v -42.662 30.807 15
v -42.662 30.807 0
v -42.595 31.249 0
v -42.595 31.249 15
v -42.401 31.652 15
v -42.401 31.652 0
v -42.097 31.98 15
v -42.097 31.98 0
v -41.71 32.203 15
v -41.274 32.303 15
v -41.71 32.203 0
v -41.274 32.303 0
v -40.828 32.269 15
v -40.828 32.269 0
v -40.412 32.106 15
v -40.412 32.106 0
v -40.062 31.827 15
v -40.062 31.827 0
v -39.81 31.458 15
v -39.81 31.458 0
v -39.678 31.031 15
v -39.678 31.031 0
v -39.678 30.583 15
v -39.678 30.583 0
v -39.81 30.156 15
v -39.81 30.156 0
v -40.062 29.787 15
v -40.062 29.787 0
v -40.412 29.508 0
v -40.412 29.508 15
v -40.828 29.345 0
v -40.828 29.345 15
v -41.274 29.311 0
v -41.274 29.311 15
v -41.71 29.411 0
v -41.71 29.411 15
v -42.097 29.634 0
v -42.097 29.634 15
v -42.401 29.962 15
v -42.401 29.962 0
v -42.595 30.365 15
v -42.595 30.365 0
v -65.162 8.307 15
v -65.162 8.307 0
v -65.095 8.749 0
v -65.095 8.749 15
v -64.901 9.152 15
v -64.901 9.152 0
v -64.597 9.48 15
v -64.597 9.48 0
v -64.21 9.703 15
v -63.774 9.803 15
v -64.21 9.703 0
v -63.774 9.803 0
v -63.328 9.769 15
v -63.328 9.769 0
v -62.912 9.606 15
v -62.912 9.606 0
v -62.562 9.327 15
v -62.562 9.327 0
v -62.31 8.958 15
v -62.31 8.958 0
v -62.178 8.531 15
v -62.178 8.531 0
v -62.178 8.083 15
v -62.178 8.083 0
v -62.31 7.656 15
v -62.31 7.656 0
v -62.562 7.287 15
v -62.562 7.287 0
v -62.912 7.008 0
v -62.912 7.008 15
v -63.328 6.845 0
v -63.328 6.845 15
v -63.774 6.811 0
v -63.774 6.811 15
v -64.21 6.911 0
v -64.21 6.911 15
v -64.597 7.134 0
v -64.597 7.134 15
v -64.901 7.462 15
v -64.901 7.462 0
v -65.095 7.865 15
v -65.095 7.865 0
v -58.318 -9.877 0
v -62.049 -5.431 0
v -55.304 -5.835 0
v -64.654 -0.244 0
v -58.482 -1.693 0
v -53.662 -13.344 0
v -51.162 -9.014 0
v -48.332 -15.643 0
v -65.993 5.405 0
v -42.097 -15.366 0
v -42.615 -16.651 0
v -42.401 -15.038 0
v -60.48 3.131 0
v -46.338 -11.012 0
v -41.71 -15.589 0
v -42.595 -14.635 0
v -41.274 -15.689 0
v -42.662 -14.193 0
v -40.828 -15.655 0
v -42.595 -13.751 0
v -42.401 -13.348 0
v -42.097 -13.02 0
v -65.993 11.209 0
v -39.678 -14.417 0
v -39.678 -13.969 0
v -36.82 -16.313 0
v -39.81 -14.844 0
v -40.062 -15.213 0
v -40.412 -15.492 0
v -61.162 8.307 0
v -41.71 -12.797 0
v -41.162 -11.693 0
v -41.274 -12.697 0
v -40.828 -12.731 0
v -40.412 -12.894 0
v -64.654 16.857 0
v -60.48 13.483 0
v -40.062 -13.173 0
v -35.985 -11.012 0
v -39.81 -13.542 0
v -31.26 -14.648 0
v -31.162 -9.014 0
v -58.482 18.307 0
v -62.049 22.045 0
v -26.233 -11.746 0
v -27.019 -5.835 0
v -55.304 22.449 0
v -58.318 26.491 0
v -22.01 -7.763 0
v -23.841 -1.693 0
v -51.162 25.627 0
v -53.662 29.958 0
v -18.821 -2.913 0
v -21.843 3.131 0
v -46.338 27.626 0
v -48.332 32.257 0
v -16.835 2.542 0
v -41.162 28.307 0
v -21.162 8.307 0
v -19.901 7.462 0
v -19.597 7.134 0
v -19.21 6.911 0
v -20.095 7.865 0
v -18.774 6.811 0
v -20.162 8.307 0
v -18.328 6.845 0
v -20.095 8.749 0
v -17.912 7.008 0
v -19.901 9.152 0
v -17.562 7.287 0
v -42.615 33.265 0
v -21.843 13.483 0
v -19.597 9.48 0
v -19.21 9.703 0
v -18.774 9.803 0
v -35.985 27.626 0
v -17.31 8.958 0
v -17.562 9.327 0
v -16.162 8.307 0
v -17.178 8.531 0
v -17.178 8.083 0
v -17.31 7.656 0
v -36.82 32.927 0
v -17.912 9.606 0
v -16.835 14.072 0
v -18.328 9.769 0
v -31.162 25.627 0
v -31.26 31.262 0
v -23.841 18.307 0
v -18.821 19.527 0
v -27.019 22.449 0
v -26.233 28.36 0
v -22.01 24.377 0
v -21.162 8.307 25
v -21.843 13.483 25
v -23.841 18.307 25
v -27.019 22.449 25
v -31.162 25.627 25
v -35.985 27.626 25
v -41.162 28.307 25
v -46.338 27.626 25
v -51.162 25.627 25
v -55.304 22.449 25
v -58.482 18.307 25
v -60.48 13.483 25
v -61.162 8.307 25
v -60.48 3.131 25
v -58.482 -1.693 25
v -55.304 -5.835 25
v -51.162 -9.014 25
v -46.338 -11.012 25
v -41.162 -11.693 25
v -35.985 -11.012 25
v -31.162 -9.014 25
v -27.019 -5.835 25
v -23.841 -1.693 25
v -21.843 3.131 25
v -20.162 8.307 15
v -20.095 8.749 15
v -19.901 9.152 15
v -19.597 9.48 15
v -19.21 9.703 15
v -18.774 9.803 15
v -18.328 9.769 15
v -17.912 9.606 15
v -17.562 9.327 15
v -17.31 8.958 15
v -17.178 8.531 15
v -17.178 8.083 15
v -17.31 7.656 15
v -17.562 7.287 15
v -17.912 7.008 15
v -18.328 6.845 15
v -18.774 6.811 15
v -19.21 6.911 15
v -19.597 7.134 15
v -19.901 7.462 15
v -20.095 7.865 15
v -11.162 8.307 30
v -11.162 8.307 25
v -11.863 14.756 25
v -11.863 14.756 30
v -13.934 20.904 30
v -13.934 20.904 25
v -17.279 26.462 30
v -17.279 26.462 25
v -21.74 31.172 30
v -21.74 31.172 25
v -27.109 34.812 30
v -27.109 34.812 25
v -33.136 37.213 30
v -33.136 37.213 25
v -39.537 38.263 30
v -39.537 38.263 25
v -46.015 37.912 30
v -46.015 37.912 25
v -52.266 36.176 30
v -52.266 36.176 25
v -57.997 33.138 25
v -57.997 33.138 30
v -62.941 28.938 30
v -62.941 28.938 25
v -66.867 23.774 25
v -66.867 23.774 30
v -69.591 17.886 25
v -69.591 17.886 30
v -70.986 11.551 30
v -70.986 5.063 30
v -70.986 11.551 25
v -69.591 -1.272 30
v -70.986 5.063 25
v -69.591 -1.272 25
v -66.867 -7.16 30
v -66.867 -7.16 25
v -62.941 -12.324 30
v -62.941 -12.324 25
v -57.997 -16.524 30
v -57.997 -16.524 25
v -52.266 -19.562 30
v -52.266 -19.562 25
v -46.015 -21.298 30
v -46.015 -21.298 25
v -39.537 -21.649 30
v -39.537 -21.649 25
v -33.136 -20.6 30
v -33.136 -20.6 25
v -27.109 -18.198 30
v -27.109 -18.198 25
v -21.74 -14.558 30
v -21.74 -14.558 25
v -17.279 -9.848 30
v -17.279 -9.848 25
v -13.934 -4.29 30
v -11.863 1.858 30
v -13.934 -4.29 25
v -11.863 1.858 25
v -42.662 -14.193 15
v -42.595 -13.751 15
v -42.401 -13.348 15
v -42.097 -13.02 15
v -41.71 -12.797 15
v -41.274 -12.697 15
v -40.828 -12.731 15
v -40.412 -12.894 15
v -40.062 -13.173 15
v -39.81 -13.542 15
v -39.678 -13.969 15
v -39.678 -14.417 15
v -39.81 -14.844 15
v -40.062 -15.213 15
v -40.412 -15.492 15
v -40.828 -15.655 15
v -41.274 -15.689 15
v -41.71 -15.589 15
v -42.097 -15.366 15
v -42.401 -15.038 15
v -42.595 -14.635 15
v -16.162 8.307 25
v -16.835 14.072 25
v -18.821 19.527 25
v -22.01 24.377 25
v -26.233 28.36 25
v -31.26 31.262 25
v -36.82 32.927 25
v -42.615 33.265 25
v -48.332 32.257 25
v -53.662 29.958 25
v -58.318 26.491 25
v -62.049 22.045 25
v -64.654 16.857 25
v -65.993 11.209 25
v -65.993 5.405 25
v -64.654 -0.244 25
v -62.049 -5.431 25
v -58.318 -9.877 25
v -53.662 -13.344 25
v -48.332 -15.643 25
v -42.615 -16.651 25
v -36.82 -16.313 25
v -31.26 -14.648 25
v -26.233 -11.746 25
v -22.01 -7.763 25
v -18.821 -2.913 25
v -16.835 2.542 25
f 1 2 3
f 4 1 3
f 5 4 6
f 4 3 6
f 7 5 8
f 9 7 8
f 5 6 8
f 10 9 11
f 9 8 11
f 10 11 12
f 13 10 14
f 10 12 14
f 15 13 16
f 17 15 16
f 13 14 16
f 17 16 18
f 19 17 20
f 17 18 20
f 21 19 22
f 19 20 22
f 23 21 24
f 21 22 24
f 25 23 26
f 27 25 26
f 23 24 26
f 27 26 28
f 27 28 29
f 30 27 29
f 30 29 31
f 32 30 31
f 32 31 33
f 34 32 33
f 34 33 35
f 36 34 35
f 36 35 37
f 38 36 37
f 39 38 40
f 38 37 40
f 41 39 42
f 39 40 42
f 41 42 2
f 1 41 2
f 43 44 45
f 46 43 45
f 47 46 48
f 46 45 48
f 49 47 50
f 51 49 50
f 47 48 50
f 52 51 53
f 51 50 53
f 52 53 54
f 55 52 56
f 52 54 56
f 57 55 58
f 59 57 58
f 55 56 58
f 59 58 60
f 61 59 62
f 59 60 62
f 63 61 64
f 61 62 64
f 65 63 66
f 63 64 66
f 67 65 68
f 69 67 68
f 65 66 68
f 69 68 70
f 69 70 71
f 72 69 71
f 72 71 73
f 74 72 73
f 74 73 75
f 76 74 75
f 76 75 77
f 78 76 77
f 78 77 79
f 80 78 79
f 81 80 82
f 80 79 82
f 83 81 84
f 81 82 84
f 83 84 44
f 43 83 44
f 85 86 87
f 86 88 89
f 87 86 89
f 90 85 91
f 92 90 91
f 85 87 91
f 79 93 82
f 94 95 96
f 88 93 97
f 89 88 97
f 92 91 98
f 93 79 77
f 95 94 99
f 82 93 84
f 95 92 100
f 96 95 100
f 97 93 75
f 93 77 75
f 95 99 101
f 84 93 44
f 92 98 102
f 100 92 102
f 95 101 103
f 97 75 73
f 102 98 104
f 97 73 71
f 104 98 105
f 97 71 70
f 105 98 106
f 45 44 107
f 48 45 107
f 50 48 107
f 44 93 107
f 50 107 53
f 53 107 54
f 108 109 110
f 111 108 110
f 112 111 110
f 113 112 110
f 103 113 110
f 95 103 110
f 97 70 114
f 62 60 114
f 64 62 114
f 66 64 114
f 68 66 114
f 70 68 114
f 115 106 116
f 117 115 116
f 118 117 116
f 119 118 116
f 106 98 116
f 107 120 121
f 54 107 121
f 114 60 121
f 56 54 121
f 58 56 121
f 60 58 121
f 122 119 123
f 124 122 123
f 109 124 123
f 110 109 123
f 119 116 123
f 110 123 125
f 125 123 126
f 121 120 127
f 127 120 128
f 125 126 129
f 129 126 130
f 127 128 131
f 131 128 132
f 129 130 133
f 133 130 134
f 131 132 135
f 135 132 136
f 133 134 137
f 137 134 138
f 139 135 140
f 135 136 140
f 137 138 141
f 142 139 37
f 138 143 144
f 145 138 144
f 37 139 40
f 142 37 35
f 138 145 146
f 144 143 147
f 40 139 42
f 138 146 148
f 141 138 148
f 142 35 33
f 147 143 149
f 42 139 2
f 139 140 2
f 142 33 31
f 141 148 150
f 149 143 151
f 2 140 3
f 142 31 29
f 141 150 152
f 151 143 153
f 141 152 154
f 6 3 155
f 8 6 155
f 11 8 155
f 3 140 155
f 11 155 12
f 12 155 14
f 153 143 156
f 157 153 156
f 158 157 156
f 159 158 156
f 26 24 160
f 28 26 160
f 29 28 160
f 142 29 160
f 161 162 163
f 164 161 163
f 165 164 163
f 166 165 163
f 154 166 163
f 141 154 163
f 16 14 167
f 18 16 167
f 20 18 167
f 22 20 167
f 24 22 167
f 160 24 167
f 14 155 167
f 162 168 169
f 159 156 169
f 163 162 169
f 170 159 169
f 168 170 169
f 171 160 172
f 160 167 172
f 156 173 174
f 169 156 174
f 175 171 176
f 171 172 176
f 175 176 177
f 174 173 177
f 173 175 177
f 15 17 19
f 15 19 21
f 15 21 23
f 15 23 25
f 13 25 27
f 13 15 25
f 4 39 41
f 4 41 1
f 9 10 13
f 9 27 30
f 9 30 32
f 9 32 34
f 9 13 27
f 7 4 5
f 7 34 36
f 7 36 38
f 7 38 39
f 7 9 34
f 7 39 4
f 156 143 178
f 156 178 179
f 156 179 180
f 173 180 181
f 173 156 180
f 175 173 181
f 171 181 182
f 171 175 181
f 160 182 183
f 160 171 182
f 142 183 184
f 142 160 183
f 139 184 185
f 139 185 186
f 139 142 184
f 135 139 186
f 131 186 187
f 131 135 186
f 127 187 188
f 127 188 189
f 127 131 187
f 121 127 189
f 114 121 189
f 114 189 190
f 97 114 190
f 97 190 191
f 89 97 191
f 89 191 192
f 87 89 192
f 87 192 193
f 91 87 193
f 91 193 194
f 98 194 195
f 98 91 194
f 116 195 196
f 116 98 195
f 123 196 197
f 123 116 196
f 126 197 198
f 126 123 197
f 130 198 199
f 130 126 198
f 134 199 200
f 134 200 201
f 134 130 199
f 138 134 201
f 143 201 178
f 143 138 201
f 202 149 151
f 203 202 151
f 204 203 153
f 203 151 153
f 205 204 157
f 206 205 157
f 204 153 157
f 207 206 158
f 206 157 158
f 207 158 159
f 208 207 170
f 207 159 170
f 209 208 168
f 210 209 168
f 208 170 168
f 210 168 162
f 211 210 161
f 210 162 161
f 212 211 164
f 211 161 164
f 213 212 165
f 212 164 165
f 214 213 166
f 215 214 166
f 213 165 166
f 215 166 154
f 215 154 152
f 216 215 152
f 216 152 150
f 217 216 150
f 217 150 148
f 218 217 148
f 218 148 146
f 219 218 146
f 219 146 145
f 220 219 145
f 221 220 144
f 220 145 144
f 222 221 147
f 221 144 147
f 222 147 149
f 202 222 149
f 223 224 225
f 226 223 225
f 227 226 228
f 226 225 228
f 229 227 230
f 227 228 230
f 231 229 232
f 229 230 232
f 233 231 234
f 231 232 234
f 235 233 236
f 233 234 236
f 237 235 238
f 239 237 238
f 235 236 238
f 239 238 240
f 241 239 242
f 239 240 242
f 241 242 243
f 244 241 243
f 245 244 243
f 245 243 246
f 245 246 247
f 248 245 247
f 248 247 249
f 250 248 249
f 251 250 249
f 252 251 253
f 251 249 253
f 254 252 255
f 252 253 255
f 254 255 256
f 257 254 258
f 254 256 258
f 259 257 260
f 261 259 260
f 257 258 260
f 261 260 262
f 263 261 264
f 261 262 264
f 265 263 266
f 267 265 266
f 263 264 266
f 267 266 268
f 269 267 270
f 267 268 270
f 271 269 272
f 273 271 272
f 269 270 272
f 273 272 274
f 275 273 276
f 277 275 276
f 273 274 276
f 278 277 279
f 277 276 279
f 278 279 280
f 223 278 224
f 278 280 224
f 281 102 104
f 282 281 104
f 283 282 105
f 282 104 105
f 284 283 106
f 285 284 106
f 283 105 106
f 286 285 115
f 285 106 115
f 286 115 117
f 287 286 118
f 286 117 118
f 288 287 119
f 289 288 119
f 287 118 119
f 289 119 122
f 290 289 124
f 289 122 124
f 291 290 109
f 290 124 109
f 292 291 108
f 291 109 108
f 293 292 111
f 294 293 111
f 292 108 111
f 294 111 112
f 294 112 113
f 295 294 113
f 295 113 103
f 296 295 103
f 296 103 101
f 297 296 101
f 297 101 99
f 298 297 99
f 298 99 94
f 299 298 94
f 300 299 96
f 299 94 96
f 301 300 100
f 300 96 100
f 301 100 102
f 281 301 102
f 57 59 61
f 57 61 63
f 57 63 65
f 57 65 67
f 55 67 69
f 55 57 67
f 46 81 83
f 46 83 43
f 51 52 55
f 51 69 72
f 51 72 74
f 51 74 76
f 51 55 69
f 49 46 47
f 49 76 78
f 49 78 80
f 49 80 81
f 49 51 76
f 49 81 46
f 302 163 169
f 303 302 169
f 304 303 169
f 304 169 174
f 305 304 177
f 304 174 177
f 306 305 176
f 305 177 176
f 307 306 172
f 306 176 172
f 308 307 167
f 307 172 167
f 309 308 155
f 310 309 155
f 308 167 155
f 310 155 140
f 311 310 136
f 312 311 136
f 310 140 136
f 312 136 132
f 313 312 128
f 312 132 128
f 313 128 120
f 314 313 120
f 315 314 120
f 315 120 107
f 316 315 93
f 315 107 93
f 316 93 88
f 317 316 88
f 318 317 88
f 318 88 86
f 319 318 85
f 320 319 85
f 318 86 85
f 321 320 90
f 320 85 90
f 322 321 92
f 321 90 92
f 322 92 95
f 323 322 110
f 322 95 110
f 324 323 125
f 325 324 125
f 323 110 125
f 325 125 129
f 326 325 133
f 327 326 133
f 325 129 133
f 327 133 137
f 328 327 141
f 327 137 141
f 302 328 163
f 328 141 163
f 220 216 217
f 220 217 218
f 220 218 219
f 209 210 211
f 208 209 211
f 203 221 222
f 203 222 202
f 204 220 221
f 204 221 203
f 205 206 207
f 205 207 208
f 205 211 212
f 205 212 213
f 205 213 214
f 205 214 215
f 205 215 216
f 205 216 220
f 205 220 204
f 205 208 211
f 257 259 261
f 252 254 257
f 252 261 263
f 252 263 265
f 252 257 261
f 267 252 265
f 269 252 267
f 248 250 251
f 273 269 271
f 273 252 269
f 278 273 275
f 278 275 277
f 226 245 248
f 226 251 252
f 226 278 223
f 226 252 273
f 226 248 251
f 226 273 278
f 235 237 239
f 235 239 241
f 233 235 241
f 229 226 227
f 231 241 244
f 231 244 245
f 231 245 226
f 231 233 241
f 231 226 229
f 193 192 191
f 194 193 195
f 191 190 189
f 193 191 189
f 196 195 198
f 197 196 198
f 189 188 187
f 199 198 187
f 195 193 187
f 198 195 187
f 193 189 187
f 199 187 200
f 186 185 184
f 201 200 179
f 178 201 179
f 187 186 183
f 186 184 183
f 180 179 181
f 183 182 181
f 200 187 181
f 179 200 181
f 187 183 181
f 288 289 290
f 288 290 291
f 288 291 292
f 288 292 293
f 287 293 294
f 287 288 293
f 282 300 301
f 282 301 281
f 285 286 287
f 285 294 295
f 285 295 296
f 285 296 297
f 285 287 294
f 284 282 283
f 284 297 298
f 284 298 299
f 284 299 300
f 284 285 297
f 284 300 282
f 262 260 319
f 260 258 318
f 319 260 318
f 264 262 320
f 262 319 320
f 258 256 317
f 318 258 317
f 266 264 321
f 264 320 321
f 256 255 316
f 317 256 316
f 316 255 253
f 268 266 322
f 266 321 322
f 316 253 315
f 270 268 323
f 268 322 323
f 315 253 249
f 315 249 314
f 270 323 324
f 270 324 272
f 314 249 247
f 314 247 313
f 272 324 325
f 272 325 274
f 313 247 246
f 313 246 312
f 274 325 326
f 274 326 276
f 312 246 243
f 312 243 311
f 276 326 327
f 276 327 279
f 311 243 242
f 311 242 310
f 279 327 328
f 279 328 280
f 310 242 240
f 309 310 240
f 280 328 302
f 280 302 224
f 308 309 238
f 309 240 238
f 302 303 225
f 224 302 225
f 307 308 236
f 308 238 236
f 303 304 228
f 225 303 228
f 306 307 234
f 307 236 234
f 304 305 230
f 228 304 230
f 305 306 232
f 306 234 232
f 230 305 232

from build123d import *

# Parameters (mm, degrees)
SKETCH_1_R          = 25
SKETCH_1_R_2        = 20
EXTRUDE_3_DEPTH     = 25
SKETCH_12_R         = 1.5
CUT_EXTRUDE_3_DEPTH = 15
SKETCH_13_R         = 30
EXTRUDE_5_DEPTH     = 5


with BuildPart() as part:
    # 草图1 → 凸台-拉伸3 (new body)
    with BuildSketch(Plane.XY):
        with Locations((-41.161572615, 8.306984042)):
            Circle(SKETCH_1_R)
        with Locations((-41.161572615, 8.306984042)):
            Circle(SKETCH_1_R_2, mode=Mode.SUBTRACT)
    extrude(amount=EXTRUDE_3_DEPTH)

    # 草图12 → 切除-拉伸3 (cut)
    with BuildSketch(Plane(origin=(0, 0, 0), x_dir=(-1, 0, 0), z_dir=(0, 0, -1))):
        with Locations((41.161572615, 30.806984042)):
            Circle(SKETCH_12_R)
        with Locations((63.661572615, 8.306984042)):
            Circle(SKETCH_12_R)
        with Locations((41.161572615, -14.193015958)):
            Circle(SKETCH_12_R)
        with Locations((18.661572615, 8.306984042)):
            Circle(SKETCH_12_R)
    extrude(amount=-CUT_EXTRUDE_3_DEPTH, mode=Mode.SUBTRACT)

    # 草图13 → 凸台-拉伸5 (add)
    with BuildSketch(Plane.XY.offset(25)):
        with Locations((-41.161572615, 8.306984042)):
            Circle(SKETCH_13_R)
    extrude(amount=EXTRUDE_5_DEPTH)


solid = part.part
